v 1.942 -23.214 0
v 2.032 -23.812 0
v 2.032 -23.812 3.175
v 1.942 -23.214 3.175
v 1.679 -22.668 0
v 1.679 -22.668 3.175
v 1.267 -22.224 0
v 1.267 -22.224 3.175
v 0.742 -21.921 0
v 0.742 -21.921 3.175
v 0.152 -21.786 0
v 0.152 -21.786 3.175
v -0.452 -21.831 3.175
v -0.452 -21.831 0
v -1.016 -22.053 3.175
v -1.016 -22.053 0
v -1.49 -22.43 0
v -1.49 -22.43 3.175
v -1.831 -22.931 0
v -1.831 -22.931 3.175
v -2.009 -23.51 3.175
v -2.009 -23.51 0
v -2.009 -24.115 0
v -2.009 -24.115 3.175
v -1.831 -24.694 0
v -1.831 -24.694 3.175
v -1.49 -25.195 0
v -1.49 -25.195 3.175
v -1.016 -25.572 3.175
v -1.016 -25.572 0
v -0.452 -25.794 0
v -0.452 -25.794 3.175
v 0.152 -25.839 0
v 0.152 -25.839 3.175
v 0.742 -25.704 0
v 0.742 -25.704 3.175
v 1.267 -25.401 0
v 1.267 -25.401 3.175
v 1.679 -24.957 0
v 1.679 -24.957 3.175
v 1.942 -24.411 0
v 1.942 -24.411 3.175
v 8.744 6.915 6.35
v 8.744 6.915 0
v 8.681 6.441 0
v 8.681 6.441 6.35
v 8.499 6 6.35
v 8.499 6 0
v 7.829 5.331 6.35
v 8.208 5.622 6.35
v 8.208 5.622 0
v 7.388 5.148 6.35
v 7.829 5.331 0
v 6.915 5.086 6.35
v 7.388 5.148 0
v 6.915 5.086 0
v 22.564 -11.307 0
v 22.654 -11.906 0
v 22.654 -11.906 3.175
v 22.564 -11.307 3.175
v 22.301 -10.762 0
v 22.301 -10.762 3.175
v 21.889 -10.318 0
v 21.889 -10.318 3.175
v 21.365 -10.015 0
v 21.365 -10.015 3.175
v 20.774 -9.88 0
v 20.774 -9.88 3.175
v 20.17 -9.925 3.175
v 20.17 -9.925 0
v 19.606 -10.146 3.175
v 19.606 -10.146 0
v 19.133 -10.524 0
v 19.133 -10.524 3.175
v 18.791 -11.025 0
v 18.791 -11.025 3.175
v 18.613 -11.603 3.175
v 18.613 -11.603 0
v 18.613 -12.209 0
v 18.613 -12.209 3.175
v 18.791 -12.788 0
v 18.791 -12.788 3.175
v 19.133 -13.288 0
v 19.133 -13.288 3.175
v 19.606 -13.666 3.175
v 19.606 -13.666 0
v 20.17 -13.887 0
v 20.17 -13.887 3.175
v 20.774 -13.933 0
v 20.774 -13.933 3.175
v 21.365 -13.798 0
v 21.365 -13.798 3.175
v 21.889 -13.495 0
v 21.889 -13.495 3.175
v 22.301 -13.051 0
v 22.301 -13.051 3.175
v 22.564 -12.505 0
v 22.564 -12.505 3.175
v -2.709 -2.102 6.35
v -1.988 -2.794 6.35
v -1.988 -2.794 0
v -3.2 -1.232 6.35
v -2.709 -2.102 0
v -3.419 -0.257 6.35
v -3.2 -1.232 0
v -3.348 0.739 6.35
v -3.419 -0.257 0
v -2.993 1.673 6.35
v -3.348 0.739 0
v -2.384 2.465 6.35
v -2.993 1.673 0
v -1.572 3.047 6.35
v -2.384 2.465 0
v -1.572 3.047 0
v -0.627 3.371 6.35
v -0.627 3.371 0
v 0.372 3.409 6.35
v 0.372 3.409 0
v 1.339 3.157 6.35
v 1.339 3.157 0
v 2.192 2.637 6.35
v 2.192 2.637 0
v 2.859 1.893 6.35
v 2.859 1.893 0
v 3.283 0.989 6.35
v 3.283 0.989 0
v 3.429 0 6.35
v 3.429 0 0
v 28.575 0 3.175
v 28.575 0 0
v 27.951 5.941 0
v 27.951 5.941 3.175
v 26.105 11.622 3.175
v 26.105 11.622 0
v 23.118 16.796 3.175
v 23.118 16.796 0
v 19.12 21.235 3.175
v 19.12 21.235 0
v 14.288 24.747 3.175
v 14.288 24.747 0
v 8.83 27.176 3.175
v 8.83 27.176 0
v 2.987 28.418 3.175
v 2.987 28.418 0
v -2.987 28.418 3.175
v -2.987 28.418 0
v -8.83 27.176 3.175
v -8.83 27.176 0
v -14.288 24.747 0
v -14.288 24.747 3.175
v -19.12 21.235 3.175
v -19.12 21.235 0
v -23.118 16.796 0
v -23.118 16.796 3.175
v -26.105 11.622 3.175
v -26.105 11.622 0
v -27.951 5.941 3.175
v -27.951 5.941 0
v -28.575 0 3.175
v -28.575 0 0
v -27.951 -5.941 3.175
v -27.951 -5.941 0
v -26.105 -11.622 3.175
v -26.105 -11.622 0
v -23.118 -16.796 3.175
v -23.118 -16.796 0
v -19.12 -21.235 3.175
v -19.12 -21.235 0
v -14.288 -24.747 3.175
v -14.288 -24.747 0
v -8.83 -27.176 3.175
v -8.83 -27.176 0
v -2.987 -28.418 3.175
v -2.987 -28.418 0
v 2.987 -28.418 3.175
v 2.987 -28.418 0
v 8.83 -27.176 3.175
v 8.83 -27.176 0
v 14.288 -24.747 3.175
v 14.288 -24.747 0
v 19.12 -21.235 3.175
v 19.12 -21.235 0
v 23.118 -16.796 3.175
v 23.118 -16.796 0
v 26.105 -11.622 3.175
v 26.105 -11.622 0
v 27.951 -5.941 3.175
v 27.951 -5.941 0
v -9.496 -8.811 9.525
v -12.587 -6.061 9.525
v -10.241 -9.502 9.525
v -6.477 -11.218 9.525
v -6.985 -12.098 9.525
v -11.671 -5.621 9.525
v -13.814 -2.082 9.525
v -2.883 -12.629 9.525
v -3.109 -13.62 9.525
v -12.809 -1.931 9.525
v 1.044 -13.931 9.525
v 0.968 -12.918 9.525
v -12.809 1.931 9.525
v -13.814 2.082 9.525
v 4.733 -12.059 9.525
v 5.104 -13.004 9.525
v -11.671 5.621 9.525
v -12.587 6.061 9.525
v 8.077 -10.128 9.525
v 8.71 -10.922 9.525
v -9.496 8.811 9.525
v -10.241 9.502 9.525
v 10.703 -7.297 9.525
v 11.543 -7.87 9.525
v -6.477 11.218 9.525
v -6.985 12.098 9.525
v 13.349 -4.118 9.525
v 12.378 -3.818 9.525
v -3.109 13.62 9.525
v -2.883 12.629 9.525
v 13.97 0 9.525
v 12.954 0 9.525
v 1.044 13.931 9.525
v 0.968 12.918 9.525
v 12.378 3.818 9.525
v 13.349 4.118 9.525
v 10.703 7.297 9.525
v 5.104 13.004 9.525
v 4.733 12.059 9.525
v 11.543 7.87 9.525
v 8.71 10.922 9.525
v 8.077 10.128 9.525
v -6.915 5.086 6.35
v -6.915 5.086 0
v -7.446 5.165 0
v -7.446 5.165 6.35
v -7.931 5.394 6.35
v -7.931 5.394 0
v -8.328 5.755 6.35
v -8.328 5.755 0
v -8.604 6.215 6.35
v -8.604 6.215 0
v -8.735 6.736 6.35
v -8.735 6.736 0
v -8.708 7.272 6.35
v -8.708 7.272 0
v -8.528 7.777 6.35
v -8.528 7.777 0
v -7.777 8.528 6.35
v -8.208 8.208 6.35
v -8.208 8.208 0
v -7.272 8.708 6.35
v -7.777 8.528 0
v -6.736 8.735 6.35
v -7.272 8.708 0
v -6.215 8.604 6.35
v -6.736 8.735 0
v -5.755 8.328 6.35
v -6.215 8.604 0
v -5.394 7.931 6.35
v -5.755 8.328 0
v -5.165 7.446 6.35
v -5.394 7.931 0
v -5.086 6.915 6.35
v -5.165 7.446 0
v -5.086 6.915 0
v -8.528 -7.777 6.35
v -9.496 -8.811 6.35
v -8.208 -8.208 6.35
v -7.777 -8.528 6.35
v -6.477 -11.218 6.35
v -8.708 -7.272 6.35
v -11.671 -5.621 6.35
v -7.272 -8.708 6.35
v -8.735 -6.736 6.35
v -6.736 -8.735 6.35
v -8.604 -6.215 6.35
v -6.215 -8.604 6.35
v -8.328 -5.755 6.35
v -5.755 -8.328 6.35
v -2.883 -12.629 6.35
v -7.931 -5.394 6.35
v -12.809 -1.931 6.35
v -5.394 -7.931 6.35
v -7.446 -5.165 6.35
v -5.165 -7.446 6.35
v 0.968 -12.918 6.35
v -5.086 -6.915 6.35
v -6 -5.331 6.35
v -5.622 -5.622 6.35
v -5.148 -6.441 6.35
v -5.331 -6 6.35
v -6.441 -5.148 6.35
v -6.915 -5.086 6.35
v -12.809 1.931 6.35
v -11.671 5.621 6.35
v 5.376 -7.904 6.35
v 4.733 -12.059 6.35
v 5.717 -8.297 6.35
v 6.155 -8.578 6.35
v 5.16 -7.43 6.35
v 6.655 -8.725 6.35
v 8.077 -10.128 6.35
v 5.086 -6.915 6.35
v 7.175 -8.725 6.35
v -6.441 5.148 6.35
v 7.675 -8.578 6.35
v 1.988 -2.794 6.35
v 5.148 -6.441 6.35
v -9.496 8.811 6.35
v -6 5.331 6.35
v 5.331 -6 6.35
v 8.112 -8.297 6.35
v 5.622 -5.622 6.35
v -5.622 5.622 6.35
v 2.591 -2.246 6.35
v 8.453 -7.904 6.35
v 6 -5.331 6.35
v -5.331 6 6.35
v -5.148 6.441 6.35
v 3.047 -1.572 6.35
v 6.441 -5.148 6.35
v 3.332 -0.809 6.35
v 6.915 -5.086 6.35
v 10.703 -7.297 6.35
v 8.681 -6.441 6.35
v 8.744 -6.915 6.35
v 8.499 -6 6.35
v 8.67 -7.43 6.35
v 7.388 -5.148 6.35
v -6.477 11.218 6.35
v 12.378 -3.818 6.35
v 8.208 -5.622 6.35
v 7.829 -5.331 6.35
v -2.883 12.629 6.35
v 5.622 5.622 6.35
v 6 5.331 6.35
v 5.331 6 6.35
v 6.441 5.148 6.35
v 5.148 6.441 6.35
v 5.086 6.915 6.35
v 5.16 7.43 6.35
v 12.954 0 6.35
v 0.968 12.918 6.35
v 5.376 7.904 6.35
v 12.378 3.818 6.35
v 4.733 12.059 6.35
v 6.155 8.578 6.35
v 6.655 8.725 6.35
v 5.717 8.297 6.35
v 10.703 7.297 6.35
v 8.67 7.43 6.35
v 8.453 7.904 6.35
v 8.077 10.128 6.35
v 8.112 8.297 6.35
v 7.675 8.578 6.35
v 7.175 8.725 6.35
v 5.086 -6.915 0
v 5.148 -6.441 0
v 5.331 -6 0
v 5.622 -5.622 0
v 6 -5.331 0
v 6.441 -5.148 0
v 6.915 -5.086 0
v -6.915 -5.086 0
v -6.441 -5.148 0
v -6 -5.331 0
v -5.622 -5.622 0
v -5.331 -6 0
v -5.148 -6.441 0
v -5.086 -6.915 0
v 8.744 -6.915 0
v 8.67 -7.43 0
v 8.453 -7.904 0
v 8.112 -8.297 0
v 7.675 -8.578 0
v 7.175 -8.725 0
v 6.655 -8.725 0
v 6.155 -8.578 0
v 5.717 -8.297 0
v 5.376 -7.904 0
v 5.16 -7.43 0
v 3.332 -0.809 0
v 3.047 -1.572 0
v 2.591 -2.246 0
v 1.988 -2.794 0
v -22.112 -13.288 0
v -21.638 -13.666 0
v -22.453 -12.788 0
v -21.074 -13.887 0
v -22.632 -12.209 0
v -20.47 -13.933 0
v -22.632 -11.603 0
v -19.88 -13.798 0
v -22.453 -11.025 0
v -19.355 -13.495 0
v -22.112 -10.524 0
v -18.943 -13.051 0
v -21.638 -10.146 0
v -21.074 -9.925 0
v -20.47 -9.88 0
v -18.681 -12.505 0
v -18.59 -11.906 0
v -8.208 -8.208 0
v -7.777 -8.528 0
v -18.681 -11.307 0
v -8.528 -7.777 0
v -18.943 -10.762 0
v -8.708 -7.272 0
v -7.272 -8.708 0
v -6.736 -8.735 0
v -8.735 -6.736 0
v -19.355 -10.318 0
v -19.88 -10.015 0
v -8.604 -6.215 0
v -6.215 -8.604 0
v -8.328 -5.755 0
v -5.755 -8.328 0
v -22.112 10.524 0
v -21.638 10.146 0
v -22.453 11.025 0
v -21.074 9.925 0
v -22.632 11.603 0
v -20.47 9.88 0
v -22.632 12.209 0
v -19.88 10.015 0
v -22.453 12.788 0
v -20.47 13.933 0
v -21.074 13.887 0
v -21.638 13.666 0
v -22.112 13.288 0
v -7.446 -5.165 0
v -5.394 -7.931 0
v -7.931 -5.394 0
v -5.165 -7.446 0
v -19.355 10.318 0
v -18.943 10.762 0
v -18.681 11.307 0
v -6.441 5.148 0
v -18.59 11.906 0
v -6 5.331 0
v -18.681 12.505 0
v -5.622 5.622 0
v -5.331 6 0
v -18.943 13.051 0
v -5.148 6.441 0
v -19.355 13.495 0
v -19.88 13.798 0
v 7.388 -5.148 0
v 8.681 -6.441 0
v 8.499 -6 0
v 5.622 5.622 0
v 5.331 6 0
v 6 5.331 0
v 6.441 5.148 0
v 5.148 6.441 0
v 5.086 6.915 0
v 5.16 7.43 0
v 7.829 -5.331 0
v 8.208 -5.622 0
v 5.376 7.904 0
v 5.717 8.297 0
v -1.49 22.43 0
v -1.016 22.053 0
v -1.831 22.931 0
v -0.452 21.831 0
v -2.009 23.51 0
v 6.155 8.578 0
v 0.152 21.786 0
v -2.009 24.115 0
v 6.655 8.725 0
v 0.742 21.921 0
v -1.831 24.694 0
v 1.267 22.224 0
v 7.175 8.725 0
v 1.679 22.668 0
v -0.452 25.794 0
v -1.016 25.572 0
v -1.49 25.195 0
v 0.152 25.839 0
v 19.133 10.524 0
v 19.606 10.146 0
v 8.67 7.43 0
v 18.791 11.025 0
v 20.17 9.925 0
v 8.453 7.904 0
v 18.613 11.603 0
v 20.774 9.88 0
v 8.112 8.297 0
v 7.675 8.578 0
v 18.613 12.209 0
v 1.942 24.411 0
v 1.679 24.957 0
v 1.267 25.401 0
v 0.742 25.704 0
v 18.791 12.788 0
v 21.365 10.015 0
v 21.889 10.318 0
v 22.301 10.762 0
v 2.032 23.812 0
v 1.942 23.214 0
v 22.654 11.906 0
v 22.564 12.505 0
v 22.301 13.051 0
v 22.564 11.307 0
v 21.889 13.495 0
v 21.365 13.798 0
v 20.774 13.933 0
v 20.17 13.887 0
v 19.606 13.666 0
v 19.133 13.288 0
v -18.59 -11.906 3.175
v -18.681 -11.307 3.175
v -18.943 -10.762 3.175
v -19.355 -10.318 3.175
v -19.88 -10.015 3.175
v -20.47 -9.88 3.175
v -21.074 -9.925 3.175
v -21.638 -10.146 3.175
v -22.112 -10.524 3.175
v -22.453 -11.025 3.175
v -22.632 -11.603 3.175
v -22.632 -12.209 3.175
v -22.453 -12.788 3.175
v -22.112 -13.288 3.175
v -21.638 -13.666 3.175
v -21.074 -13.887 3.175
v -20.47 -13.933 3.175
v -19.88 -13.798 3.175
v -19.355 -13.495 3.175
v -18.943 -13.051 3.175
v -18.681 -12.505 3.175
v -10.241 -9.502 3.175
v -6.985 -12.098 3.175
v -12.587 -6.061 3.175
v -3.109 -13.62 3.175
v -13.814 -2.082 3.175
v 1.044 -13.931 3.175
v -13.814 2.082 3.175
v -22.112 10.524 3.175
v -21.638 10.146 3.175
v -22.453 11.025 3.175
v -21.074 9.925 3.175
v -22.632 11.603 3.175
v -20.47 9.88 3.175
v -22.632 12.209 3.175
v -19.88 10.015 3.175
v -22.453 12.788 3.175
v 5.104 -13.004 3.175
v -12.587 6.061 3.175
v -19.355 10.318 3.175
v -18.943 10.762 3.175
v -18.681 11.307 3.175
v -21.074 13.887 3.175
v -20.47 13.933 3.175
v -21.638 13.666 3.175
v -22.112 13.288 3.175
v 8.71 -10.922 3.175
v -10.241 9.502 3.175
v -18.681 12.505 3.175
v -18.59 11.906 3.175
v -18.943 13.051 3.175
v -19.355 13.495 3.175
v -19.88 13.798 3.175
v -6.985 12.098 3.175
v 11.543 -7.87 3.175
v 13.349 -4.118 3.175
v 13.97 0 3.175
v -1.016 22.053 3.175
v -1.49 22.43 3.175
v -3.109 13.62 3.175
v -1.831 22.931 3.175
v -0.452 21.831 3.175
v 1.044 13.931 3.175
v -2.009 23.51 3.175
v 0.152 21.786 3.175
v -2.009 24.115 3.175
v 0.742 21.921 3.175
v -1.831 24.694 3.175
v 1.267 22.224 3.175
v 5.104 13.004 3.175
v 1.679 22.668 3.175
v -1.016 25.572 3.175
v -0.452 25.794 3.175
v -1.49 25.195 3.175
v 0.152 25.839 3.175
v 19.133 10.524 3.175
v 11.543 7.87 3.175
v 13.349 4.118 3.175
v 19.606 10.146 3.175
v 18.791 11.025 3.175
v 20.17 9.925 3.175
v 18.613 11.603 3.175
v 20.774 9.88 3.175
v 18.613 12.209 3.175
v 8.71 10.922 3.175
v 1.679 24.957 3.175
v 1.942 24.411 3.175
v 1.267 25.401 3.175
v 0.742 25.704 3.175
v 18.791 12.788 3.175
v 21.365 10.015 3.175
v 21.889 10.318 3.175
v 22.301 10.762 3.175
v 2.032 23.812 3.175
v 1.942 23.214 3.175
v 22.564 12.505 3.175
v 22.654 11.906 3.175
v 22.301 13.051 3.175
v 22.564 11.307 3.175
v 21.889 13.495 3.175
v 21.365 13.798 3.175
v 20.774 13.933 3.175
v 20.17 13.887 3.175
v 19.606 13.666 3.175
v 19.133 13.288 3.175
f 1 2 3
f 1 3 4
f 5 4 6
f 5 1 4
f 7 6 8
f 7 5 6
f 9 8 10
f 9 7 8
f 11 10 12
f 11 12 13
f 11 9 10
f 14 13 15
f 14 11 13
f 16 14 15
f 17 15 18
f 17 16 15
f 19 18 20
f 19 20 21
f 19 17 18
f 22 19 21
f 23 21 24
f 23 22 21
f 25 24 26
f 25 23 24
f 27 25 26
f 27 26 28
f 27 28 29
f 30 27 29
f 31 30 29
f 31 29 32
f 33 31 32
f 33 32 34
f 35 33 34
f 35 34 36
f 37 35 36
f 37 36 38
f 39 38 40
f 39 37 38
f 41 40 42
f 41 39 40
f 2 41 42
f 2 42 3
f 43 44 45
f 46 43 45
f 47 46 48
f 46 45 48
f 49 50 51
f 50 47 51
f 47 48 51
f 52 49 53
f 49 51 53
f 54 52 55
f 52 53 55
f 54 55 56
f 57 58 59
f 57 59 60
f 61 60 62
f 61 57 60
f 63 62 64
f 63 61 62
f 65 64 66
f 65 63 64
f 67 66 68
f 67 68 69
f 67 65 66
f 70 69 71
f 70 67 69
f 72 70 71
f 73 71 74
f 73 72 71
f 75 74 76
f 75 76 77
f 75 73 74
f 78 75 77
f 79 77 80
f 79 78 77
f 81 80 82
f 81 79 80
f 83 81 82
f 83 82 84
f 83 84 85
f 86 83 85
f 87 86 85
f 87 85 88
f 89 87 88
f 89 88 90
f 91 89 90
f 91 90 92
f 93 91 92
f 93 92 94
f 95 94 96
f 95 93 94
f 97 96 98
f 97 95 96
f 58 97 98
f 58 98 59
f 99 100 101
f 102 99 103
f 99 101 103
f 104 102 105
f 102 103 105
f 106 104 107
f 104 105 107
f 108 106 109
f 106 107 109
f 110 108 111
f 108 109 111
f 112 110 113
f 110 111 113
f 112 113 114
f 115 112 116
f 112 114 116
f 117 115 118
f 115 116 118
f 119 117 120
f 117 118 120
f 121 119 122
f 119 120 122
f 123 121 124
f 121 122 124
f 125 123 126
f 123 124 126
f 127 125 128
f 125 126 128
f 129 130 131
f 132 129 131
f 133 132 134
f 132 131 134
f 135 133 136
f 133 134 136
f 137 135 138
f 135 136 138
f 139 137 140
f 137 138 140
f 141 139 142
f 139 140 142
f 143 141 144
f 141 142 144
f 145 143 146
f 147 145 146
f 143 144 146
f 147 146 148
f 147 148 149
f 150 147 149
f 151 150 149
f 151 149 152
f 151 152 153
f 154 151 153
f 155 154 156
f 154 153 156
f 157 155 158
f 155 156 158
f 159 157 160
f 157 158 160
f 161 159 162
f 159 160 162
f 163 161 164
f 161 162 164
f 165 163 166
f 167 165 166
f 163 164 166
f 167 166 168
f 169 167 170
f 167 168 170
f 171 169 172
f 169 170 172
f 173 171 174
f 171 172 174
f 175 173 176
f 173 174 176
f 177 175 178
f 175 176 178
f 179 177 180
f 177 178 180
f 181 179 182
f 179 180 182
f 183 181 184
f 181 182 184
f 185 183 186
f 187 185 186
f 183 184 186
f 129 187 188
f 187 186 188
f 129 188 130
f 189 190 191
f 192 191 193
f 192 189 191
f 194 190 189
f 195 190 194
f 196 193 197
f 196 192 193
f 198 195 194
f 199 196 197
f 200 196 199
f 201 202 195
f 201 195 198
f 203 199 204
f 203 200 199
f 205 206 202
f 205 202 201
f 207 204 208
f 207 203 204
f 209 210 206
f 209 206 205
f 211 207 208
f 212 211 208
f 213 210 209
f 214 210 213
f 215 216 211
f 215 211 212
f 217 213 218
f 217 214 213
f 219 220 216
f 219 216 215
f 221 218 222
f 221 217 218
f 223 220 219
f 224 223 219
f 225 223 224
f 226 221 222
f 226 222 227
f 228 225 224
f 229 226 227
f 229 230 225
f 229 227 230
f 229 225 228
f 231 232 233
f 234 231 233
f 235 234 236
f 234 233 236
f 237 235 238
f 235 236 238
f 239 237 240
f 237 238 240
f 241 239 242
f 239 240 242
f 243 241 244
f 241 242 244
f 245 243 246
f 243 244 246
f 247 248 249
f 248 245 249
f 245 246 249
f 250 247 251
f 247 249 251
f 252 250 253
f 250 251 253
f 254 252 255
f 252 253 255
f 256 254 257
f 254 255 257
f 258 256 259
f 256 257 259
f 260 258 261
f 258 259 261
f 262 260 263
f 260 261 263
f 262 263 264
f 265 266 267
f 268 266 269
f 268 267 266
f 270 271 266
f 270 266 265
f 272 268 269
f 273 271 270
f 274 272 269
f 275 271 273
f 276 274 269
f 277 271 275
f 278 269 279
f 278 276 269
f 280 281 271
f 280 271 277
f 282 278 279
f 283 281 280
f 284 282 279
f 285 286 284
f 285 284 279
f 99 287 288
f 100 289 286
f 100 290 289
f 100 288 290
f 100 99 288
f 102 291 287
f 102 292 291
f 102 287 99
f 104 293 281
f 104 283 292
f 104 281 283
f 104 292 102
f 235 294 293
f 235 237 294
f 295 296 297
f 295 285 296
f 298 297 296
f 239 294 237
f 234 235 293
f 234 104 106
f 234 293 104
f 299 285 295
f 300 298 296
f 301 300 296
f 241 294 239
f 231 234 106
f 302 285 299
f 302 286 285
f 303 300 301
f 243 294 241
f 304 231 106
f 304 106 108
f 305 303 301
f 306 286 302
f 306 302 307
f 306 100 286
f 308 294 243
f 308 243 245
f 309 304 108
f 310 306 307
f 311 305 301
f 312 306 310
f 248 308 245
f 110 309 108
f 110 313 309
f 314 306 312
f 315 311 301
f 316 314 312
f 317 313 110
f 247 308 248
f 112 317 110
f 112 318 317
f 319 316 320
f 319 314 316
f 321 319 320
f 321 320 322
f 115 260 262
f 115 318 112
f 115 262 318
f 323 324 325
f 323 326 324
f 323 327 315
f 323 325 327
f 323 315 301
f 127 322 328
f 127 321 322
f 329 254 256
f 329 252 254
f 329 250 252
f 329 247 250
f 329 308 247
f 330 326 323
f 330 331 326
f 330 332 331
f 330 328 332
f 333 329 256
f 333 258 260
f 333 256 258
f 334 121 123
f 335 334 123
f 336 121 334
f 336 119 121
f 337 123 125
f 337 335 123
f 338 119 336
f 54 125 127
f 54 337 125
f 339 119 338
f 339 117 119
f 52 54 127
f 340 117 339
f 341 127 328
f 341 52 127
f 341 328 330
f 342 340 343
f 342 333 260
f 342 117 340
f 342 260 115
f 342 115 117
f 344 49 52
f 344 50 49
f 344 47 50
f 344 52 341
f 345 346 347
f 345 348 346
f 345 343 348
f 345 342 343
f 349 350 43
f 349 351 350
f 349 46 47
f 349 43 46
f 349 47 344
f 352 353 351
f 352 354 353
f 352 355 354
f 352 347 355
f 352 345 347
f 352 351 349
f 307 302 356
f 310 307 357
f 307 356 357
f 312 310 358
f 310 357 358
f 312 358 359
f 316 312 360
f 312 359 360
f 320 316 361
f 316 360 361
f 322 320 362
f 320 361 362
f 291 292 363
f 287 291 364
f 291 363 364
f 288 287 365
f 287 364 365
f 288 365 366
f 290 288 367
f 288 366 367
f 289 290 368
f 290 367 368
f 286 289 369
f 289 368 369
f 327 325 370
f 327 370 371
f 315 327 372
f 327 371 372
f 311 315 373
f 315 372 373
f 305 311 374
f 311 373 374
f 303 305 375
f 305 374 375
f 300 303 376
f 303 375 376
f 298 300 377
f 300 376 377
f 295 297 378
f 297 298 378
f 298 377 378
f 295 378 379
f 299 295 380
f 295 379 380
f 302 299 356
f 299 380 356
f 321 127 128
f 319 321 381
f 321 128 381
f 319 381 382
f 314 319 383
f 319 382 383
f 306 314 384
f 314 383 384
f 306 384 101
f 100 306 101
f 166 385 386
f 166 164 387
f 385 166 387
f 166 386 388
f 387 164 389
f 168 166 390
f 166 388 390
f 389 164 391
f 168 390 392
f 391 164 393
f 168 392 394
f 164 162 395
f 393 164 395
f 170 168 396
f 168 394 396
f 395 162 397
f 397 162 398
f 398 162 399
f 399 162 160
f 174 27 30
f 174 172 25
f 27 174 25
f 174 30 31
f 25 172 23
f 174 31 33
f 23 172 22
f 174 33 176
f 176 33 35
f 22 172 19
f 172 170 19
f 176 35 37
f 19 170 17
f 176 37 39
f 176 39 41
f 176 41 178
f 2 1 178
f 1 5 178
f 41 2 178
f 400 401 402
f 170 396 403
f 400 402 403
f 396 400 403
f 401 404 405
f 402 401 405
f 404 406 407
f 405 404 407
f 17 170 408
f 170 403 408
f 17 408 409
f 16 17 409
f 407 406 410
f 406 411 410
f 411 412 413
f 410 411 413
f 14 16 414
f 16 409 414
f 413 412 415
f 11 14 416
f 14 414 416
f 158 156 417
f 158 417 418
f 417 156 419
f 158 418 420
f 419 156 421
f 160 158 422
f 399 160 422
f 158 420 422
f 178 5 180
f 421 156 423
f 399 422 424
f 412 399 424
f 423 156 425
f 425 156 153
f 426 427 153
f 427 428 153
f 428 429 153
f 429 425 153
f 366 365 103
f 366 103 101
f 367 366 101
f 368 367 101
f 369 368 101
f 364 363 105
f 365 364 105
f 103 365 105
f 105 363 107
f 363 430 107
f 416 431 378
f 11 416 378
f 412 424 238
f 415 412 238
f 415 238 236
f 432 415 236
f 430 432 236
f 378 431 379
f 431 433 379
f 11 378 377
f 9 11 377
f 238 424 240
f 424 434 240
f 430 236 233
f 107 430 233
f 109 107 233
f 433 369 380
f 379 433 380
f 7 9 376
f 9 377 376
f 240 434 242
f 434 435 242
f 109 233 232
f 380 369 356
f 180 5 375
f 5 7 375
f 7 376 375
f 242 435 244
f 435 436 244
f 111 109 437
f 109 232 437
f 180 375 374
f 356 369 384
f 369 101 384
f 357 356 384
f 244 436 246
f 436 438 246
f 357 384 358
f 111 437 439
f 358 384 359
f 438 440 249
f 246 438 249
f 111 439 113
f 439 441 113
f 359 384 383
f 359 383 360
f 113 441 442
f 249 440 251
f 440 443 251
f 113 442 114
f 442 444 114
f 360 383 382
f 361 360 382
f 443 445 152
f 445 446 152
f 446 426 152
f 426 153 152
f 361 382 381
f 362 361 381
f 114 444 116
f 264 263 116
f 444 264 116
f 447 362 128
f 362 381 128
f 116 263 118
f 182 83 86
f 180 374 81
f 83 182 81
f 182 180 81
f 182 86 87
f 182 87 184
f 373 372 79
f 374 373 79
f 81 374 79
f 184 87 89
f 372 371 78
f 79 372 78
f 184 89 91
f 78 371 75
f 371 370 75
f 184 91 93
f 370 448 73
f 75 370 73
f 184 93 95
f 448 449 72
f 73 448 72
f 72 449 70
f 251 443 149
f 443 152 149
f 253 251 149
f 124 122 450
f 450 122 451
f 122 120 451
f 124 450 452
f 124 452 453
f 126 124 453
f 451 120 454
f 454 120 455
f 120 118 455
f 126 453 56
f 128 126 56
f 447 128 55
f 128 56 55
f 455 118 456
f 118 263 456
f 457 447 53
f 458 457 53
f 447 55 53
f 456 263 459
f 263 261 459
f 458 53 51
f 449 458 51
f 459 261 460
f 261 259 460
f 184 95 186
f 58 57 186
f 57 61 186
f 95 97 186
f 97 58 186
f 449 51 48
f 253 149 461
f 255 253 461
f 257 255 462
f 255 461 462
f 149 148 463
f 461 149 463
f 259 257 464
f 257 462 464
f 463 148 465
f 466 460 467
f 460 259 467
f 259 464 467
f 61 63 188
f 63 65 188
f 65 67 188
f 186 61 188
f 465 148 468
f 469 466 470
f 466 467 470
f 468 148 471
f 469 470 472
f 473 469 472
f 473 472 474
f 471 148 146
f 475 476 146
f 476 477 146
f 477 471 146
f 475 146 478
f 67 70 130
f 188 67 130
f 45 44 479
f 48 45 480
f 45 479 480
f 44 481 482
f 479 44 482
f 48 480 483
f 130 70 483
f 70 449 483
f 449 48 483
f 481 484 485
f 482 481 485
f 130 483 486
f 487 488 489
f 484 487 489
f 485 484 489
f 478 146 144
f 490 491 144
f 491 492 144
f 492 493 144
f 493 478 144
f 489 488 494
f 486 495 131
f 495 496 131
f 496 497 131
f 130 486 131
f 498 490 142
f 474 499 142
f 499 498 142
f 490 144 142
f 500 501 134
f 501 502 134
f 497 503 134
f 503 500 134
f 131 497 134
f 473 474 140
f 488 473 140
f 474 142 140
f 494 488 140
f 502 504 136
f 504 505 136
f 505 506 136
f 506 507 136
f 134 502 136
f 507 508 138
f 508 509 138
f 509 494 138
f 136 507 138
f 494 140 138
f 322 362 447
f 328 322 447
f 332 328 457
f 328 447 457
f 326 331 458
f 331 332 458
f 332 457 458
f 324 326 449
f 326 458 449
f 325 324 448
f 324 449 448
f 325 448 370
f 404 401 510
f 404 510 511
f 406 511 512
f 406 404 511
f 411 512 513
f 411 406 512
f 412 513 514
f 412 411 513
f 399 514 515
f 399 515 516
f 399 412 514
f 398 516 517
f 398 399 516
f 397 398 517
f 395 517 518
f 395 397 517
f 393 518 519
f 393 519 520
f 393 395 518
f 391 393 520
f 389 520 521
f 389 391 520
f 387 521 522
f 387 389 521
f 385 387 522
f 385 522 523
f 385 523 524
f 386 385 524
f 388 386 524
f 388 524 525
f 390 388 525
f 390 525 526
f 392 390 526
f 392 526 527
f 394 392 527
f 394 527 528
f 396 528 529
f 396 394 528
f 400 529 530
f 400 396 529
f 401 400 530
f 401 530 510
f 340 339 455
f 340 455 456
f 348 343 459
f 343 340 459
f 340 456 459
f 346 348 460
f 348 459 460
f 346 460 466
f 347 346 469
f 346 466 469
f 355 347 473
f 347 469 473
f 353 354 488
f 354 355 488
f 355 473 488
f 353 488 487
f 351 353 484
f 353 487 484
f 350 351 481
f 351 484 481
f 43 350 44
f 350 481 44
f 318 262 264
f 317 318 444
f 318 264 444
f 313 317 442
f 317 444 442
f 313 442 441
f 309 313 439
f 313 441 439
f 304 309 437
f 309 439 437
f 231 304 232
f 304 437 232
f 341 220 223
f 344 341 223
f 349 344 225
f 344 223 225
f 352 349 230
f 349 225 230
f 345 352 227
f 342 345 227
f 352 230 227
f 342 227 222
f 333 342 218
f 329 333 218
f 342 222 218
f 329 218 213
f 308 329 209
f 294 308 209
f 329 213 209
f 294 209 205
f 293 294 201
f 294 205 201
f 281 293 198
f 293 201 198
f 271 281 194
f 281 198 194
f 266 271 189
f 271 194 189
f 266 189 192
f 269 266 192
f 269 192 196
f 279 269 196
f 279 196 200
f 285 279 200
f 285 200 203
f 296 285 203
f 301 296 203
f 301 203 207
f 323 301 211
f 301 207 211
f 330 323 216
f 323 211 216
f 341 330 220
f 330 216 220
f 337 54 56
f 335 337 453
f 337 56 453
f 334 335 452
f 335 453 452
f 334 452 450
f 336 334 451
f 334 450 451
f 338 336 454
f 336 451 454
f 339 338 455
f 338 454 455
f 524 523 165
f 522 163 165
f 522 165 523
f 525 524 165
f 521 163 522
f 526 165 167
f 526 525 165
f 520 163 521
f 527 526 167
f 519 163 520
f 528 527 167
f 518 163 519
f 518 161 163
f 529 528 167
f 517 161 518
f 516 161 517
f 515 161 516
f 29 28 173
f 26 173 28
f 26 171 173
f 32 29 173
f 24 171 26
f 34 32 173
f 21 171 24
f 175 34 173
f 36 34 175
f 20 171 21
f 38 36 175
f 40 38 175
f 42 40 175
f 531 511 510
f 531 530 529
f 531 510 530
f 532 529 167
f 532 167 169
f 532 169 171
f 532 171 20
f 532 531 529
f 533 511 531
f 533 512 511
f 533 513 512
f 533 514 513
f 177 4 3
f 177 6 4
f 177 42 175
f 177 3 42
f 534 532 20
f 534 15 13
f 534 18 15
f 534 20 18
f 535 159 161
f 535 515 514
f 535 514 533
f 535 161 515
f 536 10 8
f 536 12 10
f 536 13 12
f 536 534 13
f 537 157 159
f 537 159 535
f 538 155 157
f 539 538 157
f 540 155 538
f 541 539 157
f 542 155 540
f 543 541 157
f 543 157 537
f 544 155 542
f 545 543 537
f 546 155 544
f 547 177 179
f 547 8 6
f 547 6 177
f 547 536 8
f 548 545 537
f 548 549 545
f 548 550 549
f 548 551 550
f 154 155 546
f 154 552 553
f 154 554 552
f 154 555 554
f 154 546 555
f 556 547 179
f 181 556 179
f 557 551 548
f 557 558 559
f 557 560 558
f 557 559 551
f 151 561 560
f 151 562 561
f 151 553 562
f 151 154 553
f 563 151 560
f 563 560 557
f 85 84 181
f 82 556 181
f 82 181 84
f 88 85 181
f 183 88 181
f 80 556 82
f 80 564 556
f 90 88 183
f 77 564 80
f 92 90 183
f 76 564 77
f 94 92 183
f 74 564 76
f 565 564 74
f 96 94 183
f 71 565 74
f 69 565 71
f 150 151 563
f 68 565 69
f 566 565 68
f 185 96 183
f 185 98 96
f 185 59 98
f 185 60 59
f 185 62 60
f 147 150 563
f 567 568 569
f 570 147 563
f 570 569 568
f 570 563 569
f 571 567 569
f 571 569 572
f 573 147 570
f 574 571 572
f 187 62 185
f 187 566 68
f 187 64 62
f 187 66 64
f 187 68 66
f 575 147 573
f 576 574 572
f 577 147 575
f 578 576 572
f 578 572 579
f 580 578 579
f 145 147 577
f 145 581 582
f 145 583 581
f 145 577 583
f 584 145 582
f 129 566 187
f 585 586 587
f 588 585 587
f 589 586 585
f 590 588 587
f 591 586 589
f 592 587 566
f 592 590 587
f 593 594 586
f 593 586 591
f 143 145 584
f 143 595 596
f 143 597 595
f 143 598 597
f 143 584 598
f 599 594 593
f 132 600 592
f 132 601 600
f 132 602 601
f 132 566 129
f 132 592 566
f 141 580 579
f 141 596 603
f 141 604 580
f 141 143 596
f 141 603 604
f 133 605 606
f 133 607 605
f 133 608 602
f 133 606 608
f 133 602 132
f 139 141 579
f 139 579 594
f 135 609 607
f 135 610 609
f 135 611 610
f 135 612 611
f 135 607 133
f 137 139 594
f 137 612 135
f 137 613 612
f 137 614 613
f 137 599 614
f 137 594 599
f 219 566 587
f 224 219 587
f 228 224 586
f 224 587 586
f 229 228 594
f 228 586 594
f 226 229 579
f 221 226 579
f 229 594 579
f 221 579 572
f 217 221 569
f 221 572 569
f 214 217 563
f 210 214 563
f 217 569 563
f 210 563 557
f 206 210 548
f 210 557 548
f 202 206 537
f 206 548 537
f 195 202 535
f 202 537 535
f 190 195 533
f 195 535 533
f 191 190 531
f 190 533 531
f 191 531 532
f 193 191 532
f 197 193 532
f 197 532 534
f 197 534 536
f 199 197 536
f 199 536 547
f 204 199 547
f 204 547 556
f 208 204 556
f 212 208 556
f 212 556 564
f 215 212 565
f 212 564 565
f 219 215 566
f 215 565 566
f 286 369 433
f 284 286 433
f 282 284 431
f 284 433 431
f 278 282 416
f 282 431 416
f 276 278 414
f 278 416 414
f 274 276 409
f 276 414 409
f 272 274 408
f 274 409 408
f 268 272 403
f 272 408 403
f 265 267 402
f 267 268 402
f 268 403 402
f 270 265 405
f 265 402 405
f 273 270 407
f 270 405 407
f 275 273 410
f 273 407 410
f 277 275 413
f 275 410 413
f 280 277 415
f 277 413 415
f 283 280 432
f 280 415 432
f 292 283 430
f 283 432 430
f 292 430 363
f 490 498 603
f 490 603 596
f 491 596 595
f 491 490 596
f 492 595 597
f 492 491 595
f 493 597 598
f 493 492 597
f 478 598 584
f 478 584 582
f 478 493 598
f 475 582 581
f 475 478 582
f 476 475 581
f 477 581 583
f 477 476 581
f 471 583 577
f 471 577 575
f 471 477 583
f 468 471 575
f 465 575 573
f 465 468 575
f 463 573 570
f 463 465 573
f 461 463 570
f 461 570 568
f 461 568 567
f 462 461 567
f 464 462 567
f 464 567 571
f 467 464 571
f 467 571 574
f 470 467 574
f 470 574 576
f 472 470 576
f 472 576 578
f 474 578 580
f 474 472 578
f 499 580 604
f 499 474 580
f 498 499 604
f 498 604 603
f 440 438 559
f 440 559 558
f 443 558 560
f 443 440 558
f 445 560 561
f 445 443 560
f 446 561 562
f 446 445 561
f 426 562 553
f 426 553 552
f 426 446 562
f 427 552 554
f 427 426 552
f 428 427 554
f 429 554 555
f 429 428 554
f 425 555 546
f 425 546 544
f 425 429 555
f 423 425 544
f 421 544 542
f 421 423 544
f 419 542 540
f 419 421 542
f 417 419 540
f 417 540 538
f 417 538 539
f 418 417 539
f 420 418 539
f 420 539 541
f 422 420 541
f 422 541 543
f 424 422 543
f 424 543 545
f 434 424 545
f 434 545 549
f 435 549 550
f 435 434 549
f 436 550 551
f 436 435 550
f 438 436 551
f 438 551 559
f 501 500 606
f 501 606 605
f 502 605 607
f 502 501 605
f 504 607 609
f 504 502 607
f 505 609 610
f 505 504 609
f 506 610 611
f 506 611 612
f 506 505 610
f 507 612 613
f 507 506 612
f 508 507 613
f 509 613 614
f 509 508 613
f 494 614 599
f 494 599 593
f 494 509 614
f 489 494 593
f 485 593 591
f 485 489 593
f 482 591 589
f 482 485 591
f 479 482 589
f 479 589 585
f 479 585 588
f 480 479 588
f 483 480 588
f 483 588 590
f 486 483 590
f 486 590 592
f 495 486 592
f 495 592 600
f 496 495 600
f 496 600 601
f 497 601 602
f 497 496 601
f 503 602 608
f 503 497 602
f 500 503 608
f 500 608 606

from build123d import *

# Parameters (mm, degrees)
F0_R     = 28.575
F0_R_2   = 2.032
F1_DEPTH = 3.175
F2_R     = 13.97
F3_DEPTH = 6.35
F5_DEPTH = 9.525
F7_DEPTH = 9.525
F8_R     = 12.954
F8_R_2   = 1.8288
F9_DEPTH = 3.175


with BuildPart() as f1:
    # F0 (on Top) → F1 (new body)
    with BuildSketch(Plane.XY):
        Circle(F0_R)
        with Locations((-20.6222299276, -11.90625)):
            Circle(F0_R_2, mode=Mode.SUBTRACT)
        with Locations((0, -23.8125)):
            Circle(F0_R_2, mode=Mode.SUBTRACT)
        with Locations((20.6222299276, -11.90625)):
            Circle(F0_R_2, mode=Mode.SUBTRACT)
        with Locations((-20.6222299276, 11.90625)):
            Circle(F0_R_2, mode=Mode.SUBTRACT)
        with Locations((20.6222299276, 11.90625)):
            Circle(F0_R_2, mode=Mode.SUBTRACT)
        with Locations((0, 23.8125)):
            Circle(F0_R_2, mode=Mode.SUBTRACT)
    extrude(amount=F1_DEPTH)

    # F2 (on face) → F3 (join)
    with BuildSketch(Plane.XY.offset(3.175)):
        Circle(F2_R)
    extrude(amount=F3_DEPTH)

    # F4 (on face) → F5 (cut, through all)
    with BuildSketch(Plane(origin=(0, 0, 0), x_dir=(1, 0, 0), z_dir=(0, 0, -1))):
        with BuildLine():
            ThreePointArc((-1.987864432, 2.794), (-1.5718864244, -3.0474930793), (3.429, 0))
            ThreePointArc((3.429, 0), (3.0474930793, 1.5718864244), (1.987864432, 2.794))
            Line((1.987864432, 2.794), (0, 2.794))
            Line((0, 2.794), (-1.987864432, 2.794))
        make_face()
    extrude(amount=-F5_DEPTH, mode=Mode.SUBTRACT)

    # F6 (on face) → F7 (cut, through all)
    with BuildSketch(Plane(origin=(0, 0, 0), x_dir=(1, 0, 0), z_dir=(0, 0, -1))):
        with BuildLine():
            Line((-6.9147972132, -6.9147972132), (-5.0859972132, -6.9147972132))
            ThreePointArc((-5.0859972132, -6.9147972132), (-5.6216403318, -5.6216403318), (-6.9147972132, -5.0859972132))
            Line((-6.9147972132, -5.0859972132), (-6.9147972132, -6.9147972132))
        make_face()
        with BuildLine():
            ThreePointArc((-6.9147972132, -5.0859972132), (-8.2079540947, -8.2079540947), (-5.0859972132, -6.9147972132))
            Line((-5.0859972132, -6.9147972132), (-6.9147972132, -6.9147972132))
            Line((-6.9147972132, -6.9147972132), (-6.9147972132, -5.0859972132))
        make_face()
        with BuildLine():
            Line((-6.9147972132, 6.9147972132), (-6.9147972132, 5.0859972132))
            ThreePointArc((-6.9147972132, 5.0859972132), (-5.6216403318, 5.6216403318), (-5.0859972132, 6.9147972132))
            Line((-5.0859972132, 6.9147972132), (-6.9147972132, 6.9147972132))
        make_face()
        with BuildLine():
            ThreePointArc((-5.0859972132, 6.9147972132), (-8.2079540947, 8.2079540947), (-6.9147972132, 5.0859972132))
            Line((-6.9147972132, 5.0859972132), (-6.9147972132, 6.9147972132))
            Line((-6.9147972132, 6.9147972132), (-5.0859972132, 6.9147972132))
        make_face()
        with BuildLine():
            Line((6.9147972132, 6.9147972132), (6.9147972132, 5.0859972132))
            ThreePointArc((6.9147972132, 5.0859972132), (8.2079540947, 5.6216403318), (8.7435972132, 6.9147972132))
            ThreePointArc((8.7435972132, 6.9147972132), (6.9147972132, 8.7435972132), (5.0859972132, 6.9147972132))
            Line((5.0859972132, 6.9147972132), (6.9147972132, 6.9147972132))
        make_face()
        with BuildLine():
            ThreePointArc((5.0859972132, 6.9147972132), (5.6216403318, 5.6216403318), (6.9147972132, 5.0859972132))
            Line((6.9147972132, 5.0859972132), (6.9147972132, 6.9147972132))
            Line((6.9147972132, 6.9147972132), (5.0859972132, 6.9147972132))
        make_face()
        with BuildLine():
            ThreePointArc((6.9147972132, -5.0859972132), (5.6216403318, -5.6216403318), (5.0859972132, -6.9147972132))
            Line((5.0859972132, -6.9147972132), (6.9147972132, -6.9147972132))
            Line((6.9147972132, -6.9147972132), (6.9147972132, -5.0859972132))
        make_face()
        with BuildLine():
            Line((6.9147972132, -6.9147972132), (5.0859972132, -6.9147972132))
            ThreePointArc((5.0859972132, -6.9147972132), (6.9147972132, -8.7435972132), (8.7435972132, -6.9147972132))
            ThreePointArc((8.7435972132, -6.9147972132), (8.2079540947, -5.6216403318), (6.9147972132, -5.0859972132))
            Line((6.9147972132, -5.0859972132), (6.9147972132, -6.9147972132))
        make_face()
    extrude(amount=-F7_DEPTH, mode=Mode.SUBTRACT)

    # F8 (on face) → F9 (cut)
    with BuildSketch(Plane.XY.offset(9.525)):
        Circle(F8_R)
        with Locations((-6.9147972132, -6.9147972132)):
            Circle(F8_R_2, mode=Mode.SUBTRACT)
        with Locations((6.9147972132, -6.9147972132)):
            Circle(F8_R_2, mode=Mode.SUBTRACT)
        with BuildLine():
            ThreePointArc((-1.987864432, -2.794), (0, 3.429), (1.987864432, -2.794))
            Line((1.987864432, -2.794), (-1.987864432, -2.794))
        make_face(mode=Mode.SUBTRACT)
        with Locations((-6.9147972132, 6.9147972132)):
            Circle(F8_R_2, mode=Mode.SUBTRACT)
        with Locations((6.9147972132, 6.9147972132)):
            Circle(F8_R_2, mode=Mode.SUBTRACT)
    extrude(amount=-F9_DEPTH, mode=Mode.SUBTRACT)


solid = f1.part
